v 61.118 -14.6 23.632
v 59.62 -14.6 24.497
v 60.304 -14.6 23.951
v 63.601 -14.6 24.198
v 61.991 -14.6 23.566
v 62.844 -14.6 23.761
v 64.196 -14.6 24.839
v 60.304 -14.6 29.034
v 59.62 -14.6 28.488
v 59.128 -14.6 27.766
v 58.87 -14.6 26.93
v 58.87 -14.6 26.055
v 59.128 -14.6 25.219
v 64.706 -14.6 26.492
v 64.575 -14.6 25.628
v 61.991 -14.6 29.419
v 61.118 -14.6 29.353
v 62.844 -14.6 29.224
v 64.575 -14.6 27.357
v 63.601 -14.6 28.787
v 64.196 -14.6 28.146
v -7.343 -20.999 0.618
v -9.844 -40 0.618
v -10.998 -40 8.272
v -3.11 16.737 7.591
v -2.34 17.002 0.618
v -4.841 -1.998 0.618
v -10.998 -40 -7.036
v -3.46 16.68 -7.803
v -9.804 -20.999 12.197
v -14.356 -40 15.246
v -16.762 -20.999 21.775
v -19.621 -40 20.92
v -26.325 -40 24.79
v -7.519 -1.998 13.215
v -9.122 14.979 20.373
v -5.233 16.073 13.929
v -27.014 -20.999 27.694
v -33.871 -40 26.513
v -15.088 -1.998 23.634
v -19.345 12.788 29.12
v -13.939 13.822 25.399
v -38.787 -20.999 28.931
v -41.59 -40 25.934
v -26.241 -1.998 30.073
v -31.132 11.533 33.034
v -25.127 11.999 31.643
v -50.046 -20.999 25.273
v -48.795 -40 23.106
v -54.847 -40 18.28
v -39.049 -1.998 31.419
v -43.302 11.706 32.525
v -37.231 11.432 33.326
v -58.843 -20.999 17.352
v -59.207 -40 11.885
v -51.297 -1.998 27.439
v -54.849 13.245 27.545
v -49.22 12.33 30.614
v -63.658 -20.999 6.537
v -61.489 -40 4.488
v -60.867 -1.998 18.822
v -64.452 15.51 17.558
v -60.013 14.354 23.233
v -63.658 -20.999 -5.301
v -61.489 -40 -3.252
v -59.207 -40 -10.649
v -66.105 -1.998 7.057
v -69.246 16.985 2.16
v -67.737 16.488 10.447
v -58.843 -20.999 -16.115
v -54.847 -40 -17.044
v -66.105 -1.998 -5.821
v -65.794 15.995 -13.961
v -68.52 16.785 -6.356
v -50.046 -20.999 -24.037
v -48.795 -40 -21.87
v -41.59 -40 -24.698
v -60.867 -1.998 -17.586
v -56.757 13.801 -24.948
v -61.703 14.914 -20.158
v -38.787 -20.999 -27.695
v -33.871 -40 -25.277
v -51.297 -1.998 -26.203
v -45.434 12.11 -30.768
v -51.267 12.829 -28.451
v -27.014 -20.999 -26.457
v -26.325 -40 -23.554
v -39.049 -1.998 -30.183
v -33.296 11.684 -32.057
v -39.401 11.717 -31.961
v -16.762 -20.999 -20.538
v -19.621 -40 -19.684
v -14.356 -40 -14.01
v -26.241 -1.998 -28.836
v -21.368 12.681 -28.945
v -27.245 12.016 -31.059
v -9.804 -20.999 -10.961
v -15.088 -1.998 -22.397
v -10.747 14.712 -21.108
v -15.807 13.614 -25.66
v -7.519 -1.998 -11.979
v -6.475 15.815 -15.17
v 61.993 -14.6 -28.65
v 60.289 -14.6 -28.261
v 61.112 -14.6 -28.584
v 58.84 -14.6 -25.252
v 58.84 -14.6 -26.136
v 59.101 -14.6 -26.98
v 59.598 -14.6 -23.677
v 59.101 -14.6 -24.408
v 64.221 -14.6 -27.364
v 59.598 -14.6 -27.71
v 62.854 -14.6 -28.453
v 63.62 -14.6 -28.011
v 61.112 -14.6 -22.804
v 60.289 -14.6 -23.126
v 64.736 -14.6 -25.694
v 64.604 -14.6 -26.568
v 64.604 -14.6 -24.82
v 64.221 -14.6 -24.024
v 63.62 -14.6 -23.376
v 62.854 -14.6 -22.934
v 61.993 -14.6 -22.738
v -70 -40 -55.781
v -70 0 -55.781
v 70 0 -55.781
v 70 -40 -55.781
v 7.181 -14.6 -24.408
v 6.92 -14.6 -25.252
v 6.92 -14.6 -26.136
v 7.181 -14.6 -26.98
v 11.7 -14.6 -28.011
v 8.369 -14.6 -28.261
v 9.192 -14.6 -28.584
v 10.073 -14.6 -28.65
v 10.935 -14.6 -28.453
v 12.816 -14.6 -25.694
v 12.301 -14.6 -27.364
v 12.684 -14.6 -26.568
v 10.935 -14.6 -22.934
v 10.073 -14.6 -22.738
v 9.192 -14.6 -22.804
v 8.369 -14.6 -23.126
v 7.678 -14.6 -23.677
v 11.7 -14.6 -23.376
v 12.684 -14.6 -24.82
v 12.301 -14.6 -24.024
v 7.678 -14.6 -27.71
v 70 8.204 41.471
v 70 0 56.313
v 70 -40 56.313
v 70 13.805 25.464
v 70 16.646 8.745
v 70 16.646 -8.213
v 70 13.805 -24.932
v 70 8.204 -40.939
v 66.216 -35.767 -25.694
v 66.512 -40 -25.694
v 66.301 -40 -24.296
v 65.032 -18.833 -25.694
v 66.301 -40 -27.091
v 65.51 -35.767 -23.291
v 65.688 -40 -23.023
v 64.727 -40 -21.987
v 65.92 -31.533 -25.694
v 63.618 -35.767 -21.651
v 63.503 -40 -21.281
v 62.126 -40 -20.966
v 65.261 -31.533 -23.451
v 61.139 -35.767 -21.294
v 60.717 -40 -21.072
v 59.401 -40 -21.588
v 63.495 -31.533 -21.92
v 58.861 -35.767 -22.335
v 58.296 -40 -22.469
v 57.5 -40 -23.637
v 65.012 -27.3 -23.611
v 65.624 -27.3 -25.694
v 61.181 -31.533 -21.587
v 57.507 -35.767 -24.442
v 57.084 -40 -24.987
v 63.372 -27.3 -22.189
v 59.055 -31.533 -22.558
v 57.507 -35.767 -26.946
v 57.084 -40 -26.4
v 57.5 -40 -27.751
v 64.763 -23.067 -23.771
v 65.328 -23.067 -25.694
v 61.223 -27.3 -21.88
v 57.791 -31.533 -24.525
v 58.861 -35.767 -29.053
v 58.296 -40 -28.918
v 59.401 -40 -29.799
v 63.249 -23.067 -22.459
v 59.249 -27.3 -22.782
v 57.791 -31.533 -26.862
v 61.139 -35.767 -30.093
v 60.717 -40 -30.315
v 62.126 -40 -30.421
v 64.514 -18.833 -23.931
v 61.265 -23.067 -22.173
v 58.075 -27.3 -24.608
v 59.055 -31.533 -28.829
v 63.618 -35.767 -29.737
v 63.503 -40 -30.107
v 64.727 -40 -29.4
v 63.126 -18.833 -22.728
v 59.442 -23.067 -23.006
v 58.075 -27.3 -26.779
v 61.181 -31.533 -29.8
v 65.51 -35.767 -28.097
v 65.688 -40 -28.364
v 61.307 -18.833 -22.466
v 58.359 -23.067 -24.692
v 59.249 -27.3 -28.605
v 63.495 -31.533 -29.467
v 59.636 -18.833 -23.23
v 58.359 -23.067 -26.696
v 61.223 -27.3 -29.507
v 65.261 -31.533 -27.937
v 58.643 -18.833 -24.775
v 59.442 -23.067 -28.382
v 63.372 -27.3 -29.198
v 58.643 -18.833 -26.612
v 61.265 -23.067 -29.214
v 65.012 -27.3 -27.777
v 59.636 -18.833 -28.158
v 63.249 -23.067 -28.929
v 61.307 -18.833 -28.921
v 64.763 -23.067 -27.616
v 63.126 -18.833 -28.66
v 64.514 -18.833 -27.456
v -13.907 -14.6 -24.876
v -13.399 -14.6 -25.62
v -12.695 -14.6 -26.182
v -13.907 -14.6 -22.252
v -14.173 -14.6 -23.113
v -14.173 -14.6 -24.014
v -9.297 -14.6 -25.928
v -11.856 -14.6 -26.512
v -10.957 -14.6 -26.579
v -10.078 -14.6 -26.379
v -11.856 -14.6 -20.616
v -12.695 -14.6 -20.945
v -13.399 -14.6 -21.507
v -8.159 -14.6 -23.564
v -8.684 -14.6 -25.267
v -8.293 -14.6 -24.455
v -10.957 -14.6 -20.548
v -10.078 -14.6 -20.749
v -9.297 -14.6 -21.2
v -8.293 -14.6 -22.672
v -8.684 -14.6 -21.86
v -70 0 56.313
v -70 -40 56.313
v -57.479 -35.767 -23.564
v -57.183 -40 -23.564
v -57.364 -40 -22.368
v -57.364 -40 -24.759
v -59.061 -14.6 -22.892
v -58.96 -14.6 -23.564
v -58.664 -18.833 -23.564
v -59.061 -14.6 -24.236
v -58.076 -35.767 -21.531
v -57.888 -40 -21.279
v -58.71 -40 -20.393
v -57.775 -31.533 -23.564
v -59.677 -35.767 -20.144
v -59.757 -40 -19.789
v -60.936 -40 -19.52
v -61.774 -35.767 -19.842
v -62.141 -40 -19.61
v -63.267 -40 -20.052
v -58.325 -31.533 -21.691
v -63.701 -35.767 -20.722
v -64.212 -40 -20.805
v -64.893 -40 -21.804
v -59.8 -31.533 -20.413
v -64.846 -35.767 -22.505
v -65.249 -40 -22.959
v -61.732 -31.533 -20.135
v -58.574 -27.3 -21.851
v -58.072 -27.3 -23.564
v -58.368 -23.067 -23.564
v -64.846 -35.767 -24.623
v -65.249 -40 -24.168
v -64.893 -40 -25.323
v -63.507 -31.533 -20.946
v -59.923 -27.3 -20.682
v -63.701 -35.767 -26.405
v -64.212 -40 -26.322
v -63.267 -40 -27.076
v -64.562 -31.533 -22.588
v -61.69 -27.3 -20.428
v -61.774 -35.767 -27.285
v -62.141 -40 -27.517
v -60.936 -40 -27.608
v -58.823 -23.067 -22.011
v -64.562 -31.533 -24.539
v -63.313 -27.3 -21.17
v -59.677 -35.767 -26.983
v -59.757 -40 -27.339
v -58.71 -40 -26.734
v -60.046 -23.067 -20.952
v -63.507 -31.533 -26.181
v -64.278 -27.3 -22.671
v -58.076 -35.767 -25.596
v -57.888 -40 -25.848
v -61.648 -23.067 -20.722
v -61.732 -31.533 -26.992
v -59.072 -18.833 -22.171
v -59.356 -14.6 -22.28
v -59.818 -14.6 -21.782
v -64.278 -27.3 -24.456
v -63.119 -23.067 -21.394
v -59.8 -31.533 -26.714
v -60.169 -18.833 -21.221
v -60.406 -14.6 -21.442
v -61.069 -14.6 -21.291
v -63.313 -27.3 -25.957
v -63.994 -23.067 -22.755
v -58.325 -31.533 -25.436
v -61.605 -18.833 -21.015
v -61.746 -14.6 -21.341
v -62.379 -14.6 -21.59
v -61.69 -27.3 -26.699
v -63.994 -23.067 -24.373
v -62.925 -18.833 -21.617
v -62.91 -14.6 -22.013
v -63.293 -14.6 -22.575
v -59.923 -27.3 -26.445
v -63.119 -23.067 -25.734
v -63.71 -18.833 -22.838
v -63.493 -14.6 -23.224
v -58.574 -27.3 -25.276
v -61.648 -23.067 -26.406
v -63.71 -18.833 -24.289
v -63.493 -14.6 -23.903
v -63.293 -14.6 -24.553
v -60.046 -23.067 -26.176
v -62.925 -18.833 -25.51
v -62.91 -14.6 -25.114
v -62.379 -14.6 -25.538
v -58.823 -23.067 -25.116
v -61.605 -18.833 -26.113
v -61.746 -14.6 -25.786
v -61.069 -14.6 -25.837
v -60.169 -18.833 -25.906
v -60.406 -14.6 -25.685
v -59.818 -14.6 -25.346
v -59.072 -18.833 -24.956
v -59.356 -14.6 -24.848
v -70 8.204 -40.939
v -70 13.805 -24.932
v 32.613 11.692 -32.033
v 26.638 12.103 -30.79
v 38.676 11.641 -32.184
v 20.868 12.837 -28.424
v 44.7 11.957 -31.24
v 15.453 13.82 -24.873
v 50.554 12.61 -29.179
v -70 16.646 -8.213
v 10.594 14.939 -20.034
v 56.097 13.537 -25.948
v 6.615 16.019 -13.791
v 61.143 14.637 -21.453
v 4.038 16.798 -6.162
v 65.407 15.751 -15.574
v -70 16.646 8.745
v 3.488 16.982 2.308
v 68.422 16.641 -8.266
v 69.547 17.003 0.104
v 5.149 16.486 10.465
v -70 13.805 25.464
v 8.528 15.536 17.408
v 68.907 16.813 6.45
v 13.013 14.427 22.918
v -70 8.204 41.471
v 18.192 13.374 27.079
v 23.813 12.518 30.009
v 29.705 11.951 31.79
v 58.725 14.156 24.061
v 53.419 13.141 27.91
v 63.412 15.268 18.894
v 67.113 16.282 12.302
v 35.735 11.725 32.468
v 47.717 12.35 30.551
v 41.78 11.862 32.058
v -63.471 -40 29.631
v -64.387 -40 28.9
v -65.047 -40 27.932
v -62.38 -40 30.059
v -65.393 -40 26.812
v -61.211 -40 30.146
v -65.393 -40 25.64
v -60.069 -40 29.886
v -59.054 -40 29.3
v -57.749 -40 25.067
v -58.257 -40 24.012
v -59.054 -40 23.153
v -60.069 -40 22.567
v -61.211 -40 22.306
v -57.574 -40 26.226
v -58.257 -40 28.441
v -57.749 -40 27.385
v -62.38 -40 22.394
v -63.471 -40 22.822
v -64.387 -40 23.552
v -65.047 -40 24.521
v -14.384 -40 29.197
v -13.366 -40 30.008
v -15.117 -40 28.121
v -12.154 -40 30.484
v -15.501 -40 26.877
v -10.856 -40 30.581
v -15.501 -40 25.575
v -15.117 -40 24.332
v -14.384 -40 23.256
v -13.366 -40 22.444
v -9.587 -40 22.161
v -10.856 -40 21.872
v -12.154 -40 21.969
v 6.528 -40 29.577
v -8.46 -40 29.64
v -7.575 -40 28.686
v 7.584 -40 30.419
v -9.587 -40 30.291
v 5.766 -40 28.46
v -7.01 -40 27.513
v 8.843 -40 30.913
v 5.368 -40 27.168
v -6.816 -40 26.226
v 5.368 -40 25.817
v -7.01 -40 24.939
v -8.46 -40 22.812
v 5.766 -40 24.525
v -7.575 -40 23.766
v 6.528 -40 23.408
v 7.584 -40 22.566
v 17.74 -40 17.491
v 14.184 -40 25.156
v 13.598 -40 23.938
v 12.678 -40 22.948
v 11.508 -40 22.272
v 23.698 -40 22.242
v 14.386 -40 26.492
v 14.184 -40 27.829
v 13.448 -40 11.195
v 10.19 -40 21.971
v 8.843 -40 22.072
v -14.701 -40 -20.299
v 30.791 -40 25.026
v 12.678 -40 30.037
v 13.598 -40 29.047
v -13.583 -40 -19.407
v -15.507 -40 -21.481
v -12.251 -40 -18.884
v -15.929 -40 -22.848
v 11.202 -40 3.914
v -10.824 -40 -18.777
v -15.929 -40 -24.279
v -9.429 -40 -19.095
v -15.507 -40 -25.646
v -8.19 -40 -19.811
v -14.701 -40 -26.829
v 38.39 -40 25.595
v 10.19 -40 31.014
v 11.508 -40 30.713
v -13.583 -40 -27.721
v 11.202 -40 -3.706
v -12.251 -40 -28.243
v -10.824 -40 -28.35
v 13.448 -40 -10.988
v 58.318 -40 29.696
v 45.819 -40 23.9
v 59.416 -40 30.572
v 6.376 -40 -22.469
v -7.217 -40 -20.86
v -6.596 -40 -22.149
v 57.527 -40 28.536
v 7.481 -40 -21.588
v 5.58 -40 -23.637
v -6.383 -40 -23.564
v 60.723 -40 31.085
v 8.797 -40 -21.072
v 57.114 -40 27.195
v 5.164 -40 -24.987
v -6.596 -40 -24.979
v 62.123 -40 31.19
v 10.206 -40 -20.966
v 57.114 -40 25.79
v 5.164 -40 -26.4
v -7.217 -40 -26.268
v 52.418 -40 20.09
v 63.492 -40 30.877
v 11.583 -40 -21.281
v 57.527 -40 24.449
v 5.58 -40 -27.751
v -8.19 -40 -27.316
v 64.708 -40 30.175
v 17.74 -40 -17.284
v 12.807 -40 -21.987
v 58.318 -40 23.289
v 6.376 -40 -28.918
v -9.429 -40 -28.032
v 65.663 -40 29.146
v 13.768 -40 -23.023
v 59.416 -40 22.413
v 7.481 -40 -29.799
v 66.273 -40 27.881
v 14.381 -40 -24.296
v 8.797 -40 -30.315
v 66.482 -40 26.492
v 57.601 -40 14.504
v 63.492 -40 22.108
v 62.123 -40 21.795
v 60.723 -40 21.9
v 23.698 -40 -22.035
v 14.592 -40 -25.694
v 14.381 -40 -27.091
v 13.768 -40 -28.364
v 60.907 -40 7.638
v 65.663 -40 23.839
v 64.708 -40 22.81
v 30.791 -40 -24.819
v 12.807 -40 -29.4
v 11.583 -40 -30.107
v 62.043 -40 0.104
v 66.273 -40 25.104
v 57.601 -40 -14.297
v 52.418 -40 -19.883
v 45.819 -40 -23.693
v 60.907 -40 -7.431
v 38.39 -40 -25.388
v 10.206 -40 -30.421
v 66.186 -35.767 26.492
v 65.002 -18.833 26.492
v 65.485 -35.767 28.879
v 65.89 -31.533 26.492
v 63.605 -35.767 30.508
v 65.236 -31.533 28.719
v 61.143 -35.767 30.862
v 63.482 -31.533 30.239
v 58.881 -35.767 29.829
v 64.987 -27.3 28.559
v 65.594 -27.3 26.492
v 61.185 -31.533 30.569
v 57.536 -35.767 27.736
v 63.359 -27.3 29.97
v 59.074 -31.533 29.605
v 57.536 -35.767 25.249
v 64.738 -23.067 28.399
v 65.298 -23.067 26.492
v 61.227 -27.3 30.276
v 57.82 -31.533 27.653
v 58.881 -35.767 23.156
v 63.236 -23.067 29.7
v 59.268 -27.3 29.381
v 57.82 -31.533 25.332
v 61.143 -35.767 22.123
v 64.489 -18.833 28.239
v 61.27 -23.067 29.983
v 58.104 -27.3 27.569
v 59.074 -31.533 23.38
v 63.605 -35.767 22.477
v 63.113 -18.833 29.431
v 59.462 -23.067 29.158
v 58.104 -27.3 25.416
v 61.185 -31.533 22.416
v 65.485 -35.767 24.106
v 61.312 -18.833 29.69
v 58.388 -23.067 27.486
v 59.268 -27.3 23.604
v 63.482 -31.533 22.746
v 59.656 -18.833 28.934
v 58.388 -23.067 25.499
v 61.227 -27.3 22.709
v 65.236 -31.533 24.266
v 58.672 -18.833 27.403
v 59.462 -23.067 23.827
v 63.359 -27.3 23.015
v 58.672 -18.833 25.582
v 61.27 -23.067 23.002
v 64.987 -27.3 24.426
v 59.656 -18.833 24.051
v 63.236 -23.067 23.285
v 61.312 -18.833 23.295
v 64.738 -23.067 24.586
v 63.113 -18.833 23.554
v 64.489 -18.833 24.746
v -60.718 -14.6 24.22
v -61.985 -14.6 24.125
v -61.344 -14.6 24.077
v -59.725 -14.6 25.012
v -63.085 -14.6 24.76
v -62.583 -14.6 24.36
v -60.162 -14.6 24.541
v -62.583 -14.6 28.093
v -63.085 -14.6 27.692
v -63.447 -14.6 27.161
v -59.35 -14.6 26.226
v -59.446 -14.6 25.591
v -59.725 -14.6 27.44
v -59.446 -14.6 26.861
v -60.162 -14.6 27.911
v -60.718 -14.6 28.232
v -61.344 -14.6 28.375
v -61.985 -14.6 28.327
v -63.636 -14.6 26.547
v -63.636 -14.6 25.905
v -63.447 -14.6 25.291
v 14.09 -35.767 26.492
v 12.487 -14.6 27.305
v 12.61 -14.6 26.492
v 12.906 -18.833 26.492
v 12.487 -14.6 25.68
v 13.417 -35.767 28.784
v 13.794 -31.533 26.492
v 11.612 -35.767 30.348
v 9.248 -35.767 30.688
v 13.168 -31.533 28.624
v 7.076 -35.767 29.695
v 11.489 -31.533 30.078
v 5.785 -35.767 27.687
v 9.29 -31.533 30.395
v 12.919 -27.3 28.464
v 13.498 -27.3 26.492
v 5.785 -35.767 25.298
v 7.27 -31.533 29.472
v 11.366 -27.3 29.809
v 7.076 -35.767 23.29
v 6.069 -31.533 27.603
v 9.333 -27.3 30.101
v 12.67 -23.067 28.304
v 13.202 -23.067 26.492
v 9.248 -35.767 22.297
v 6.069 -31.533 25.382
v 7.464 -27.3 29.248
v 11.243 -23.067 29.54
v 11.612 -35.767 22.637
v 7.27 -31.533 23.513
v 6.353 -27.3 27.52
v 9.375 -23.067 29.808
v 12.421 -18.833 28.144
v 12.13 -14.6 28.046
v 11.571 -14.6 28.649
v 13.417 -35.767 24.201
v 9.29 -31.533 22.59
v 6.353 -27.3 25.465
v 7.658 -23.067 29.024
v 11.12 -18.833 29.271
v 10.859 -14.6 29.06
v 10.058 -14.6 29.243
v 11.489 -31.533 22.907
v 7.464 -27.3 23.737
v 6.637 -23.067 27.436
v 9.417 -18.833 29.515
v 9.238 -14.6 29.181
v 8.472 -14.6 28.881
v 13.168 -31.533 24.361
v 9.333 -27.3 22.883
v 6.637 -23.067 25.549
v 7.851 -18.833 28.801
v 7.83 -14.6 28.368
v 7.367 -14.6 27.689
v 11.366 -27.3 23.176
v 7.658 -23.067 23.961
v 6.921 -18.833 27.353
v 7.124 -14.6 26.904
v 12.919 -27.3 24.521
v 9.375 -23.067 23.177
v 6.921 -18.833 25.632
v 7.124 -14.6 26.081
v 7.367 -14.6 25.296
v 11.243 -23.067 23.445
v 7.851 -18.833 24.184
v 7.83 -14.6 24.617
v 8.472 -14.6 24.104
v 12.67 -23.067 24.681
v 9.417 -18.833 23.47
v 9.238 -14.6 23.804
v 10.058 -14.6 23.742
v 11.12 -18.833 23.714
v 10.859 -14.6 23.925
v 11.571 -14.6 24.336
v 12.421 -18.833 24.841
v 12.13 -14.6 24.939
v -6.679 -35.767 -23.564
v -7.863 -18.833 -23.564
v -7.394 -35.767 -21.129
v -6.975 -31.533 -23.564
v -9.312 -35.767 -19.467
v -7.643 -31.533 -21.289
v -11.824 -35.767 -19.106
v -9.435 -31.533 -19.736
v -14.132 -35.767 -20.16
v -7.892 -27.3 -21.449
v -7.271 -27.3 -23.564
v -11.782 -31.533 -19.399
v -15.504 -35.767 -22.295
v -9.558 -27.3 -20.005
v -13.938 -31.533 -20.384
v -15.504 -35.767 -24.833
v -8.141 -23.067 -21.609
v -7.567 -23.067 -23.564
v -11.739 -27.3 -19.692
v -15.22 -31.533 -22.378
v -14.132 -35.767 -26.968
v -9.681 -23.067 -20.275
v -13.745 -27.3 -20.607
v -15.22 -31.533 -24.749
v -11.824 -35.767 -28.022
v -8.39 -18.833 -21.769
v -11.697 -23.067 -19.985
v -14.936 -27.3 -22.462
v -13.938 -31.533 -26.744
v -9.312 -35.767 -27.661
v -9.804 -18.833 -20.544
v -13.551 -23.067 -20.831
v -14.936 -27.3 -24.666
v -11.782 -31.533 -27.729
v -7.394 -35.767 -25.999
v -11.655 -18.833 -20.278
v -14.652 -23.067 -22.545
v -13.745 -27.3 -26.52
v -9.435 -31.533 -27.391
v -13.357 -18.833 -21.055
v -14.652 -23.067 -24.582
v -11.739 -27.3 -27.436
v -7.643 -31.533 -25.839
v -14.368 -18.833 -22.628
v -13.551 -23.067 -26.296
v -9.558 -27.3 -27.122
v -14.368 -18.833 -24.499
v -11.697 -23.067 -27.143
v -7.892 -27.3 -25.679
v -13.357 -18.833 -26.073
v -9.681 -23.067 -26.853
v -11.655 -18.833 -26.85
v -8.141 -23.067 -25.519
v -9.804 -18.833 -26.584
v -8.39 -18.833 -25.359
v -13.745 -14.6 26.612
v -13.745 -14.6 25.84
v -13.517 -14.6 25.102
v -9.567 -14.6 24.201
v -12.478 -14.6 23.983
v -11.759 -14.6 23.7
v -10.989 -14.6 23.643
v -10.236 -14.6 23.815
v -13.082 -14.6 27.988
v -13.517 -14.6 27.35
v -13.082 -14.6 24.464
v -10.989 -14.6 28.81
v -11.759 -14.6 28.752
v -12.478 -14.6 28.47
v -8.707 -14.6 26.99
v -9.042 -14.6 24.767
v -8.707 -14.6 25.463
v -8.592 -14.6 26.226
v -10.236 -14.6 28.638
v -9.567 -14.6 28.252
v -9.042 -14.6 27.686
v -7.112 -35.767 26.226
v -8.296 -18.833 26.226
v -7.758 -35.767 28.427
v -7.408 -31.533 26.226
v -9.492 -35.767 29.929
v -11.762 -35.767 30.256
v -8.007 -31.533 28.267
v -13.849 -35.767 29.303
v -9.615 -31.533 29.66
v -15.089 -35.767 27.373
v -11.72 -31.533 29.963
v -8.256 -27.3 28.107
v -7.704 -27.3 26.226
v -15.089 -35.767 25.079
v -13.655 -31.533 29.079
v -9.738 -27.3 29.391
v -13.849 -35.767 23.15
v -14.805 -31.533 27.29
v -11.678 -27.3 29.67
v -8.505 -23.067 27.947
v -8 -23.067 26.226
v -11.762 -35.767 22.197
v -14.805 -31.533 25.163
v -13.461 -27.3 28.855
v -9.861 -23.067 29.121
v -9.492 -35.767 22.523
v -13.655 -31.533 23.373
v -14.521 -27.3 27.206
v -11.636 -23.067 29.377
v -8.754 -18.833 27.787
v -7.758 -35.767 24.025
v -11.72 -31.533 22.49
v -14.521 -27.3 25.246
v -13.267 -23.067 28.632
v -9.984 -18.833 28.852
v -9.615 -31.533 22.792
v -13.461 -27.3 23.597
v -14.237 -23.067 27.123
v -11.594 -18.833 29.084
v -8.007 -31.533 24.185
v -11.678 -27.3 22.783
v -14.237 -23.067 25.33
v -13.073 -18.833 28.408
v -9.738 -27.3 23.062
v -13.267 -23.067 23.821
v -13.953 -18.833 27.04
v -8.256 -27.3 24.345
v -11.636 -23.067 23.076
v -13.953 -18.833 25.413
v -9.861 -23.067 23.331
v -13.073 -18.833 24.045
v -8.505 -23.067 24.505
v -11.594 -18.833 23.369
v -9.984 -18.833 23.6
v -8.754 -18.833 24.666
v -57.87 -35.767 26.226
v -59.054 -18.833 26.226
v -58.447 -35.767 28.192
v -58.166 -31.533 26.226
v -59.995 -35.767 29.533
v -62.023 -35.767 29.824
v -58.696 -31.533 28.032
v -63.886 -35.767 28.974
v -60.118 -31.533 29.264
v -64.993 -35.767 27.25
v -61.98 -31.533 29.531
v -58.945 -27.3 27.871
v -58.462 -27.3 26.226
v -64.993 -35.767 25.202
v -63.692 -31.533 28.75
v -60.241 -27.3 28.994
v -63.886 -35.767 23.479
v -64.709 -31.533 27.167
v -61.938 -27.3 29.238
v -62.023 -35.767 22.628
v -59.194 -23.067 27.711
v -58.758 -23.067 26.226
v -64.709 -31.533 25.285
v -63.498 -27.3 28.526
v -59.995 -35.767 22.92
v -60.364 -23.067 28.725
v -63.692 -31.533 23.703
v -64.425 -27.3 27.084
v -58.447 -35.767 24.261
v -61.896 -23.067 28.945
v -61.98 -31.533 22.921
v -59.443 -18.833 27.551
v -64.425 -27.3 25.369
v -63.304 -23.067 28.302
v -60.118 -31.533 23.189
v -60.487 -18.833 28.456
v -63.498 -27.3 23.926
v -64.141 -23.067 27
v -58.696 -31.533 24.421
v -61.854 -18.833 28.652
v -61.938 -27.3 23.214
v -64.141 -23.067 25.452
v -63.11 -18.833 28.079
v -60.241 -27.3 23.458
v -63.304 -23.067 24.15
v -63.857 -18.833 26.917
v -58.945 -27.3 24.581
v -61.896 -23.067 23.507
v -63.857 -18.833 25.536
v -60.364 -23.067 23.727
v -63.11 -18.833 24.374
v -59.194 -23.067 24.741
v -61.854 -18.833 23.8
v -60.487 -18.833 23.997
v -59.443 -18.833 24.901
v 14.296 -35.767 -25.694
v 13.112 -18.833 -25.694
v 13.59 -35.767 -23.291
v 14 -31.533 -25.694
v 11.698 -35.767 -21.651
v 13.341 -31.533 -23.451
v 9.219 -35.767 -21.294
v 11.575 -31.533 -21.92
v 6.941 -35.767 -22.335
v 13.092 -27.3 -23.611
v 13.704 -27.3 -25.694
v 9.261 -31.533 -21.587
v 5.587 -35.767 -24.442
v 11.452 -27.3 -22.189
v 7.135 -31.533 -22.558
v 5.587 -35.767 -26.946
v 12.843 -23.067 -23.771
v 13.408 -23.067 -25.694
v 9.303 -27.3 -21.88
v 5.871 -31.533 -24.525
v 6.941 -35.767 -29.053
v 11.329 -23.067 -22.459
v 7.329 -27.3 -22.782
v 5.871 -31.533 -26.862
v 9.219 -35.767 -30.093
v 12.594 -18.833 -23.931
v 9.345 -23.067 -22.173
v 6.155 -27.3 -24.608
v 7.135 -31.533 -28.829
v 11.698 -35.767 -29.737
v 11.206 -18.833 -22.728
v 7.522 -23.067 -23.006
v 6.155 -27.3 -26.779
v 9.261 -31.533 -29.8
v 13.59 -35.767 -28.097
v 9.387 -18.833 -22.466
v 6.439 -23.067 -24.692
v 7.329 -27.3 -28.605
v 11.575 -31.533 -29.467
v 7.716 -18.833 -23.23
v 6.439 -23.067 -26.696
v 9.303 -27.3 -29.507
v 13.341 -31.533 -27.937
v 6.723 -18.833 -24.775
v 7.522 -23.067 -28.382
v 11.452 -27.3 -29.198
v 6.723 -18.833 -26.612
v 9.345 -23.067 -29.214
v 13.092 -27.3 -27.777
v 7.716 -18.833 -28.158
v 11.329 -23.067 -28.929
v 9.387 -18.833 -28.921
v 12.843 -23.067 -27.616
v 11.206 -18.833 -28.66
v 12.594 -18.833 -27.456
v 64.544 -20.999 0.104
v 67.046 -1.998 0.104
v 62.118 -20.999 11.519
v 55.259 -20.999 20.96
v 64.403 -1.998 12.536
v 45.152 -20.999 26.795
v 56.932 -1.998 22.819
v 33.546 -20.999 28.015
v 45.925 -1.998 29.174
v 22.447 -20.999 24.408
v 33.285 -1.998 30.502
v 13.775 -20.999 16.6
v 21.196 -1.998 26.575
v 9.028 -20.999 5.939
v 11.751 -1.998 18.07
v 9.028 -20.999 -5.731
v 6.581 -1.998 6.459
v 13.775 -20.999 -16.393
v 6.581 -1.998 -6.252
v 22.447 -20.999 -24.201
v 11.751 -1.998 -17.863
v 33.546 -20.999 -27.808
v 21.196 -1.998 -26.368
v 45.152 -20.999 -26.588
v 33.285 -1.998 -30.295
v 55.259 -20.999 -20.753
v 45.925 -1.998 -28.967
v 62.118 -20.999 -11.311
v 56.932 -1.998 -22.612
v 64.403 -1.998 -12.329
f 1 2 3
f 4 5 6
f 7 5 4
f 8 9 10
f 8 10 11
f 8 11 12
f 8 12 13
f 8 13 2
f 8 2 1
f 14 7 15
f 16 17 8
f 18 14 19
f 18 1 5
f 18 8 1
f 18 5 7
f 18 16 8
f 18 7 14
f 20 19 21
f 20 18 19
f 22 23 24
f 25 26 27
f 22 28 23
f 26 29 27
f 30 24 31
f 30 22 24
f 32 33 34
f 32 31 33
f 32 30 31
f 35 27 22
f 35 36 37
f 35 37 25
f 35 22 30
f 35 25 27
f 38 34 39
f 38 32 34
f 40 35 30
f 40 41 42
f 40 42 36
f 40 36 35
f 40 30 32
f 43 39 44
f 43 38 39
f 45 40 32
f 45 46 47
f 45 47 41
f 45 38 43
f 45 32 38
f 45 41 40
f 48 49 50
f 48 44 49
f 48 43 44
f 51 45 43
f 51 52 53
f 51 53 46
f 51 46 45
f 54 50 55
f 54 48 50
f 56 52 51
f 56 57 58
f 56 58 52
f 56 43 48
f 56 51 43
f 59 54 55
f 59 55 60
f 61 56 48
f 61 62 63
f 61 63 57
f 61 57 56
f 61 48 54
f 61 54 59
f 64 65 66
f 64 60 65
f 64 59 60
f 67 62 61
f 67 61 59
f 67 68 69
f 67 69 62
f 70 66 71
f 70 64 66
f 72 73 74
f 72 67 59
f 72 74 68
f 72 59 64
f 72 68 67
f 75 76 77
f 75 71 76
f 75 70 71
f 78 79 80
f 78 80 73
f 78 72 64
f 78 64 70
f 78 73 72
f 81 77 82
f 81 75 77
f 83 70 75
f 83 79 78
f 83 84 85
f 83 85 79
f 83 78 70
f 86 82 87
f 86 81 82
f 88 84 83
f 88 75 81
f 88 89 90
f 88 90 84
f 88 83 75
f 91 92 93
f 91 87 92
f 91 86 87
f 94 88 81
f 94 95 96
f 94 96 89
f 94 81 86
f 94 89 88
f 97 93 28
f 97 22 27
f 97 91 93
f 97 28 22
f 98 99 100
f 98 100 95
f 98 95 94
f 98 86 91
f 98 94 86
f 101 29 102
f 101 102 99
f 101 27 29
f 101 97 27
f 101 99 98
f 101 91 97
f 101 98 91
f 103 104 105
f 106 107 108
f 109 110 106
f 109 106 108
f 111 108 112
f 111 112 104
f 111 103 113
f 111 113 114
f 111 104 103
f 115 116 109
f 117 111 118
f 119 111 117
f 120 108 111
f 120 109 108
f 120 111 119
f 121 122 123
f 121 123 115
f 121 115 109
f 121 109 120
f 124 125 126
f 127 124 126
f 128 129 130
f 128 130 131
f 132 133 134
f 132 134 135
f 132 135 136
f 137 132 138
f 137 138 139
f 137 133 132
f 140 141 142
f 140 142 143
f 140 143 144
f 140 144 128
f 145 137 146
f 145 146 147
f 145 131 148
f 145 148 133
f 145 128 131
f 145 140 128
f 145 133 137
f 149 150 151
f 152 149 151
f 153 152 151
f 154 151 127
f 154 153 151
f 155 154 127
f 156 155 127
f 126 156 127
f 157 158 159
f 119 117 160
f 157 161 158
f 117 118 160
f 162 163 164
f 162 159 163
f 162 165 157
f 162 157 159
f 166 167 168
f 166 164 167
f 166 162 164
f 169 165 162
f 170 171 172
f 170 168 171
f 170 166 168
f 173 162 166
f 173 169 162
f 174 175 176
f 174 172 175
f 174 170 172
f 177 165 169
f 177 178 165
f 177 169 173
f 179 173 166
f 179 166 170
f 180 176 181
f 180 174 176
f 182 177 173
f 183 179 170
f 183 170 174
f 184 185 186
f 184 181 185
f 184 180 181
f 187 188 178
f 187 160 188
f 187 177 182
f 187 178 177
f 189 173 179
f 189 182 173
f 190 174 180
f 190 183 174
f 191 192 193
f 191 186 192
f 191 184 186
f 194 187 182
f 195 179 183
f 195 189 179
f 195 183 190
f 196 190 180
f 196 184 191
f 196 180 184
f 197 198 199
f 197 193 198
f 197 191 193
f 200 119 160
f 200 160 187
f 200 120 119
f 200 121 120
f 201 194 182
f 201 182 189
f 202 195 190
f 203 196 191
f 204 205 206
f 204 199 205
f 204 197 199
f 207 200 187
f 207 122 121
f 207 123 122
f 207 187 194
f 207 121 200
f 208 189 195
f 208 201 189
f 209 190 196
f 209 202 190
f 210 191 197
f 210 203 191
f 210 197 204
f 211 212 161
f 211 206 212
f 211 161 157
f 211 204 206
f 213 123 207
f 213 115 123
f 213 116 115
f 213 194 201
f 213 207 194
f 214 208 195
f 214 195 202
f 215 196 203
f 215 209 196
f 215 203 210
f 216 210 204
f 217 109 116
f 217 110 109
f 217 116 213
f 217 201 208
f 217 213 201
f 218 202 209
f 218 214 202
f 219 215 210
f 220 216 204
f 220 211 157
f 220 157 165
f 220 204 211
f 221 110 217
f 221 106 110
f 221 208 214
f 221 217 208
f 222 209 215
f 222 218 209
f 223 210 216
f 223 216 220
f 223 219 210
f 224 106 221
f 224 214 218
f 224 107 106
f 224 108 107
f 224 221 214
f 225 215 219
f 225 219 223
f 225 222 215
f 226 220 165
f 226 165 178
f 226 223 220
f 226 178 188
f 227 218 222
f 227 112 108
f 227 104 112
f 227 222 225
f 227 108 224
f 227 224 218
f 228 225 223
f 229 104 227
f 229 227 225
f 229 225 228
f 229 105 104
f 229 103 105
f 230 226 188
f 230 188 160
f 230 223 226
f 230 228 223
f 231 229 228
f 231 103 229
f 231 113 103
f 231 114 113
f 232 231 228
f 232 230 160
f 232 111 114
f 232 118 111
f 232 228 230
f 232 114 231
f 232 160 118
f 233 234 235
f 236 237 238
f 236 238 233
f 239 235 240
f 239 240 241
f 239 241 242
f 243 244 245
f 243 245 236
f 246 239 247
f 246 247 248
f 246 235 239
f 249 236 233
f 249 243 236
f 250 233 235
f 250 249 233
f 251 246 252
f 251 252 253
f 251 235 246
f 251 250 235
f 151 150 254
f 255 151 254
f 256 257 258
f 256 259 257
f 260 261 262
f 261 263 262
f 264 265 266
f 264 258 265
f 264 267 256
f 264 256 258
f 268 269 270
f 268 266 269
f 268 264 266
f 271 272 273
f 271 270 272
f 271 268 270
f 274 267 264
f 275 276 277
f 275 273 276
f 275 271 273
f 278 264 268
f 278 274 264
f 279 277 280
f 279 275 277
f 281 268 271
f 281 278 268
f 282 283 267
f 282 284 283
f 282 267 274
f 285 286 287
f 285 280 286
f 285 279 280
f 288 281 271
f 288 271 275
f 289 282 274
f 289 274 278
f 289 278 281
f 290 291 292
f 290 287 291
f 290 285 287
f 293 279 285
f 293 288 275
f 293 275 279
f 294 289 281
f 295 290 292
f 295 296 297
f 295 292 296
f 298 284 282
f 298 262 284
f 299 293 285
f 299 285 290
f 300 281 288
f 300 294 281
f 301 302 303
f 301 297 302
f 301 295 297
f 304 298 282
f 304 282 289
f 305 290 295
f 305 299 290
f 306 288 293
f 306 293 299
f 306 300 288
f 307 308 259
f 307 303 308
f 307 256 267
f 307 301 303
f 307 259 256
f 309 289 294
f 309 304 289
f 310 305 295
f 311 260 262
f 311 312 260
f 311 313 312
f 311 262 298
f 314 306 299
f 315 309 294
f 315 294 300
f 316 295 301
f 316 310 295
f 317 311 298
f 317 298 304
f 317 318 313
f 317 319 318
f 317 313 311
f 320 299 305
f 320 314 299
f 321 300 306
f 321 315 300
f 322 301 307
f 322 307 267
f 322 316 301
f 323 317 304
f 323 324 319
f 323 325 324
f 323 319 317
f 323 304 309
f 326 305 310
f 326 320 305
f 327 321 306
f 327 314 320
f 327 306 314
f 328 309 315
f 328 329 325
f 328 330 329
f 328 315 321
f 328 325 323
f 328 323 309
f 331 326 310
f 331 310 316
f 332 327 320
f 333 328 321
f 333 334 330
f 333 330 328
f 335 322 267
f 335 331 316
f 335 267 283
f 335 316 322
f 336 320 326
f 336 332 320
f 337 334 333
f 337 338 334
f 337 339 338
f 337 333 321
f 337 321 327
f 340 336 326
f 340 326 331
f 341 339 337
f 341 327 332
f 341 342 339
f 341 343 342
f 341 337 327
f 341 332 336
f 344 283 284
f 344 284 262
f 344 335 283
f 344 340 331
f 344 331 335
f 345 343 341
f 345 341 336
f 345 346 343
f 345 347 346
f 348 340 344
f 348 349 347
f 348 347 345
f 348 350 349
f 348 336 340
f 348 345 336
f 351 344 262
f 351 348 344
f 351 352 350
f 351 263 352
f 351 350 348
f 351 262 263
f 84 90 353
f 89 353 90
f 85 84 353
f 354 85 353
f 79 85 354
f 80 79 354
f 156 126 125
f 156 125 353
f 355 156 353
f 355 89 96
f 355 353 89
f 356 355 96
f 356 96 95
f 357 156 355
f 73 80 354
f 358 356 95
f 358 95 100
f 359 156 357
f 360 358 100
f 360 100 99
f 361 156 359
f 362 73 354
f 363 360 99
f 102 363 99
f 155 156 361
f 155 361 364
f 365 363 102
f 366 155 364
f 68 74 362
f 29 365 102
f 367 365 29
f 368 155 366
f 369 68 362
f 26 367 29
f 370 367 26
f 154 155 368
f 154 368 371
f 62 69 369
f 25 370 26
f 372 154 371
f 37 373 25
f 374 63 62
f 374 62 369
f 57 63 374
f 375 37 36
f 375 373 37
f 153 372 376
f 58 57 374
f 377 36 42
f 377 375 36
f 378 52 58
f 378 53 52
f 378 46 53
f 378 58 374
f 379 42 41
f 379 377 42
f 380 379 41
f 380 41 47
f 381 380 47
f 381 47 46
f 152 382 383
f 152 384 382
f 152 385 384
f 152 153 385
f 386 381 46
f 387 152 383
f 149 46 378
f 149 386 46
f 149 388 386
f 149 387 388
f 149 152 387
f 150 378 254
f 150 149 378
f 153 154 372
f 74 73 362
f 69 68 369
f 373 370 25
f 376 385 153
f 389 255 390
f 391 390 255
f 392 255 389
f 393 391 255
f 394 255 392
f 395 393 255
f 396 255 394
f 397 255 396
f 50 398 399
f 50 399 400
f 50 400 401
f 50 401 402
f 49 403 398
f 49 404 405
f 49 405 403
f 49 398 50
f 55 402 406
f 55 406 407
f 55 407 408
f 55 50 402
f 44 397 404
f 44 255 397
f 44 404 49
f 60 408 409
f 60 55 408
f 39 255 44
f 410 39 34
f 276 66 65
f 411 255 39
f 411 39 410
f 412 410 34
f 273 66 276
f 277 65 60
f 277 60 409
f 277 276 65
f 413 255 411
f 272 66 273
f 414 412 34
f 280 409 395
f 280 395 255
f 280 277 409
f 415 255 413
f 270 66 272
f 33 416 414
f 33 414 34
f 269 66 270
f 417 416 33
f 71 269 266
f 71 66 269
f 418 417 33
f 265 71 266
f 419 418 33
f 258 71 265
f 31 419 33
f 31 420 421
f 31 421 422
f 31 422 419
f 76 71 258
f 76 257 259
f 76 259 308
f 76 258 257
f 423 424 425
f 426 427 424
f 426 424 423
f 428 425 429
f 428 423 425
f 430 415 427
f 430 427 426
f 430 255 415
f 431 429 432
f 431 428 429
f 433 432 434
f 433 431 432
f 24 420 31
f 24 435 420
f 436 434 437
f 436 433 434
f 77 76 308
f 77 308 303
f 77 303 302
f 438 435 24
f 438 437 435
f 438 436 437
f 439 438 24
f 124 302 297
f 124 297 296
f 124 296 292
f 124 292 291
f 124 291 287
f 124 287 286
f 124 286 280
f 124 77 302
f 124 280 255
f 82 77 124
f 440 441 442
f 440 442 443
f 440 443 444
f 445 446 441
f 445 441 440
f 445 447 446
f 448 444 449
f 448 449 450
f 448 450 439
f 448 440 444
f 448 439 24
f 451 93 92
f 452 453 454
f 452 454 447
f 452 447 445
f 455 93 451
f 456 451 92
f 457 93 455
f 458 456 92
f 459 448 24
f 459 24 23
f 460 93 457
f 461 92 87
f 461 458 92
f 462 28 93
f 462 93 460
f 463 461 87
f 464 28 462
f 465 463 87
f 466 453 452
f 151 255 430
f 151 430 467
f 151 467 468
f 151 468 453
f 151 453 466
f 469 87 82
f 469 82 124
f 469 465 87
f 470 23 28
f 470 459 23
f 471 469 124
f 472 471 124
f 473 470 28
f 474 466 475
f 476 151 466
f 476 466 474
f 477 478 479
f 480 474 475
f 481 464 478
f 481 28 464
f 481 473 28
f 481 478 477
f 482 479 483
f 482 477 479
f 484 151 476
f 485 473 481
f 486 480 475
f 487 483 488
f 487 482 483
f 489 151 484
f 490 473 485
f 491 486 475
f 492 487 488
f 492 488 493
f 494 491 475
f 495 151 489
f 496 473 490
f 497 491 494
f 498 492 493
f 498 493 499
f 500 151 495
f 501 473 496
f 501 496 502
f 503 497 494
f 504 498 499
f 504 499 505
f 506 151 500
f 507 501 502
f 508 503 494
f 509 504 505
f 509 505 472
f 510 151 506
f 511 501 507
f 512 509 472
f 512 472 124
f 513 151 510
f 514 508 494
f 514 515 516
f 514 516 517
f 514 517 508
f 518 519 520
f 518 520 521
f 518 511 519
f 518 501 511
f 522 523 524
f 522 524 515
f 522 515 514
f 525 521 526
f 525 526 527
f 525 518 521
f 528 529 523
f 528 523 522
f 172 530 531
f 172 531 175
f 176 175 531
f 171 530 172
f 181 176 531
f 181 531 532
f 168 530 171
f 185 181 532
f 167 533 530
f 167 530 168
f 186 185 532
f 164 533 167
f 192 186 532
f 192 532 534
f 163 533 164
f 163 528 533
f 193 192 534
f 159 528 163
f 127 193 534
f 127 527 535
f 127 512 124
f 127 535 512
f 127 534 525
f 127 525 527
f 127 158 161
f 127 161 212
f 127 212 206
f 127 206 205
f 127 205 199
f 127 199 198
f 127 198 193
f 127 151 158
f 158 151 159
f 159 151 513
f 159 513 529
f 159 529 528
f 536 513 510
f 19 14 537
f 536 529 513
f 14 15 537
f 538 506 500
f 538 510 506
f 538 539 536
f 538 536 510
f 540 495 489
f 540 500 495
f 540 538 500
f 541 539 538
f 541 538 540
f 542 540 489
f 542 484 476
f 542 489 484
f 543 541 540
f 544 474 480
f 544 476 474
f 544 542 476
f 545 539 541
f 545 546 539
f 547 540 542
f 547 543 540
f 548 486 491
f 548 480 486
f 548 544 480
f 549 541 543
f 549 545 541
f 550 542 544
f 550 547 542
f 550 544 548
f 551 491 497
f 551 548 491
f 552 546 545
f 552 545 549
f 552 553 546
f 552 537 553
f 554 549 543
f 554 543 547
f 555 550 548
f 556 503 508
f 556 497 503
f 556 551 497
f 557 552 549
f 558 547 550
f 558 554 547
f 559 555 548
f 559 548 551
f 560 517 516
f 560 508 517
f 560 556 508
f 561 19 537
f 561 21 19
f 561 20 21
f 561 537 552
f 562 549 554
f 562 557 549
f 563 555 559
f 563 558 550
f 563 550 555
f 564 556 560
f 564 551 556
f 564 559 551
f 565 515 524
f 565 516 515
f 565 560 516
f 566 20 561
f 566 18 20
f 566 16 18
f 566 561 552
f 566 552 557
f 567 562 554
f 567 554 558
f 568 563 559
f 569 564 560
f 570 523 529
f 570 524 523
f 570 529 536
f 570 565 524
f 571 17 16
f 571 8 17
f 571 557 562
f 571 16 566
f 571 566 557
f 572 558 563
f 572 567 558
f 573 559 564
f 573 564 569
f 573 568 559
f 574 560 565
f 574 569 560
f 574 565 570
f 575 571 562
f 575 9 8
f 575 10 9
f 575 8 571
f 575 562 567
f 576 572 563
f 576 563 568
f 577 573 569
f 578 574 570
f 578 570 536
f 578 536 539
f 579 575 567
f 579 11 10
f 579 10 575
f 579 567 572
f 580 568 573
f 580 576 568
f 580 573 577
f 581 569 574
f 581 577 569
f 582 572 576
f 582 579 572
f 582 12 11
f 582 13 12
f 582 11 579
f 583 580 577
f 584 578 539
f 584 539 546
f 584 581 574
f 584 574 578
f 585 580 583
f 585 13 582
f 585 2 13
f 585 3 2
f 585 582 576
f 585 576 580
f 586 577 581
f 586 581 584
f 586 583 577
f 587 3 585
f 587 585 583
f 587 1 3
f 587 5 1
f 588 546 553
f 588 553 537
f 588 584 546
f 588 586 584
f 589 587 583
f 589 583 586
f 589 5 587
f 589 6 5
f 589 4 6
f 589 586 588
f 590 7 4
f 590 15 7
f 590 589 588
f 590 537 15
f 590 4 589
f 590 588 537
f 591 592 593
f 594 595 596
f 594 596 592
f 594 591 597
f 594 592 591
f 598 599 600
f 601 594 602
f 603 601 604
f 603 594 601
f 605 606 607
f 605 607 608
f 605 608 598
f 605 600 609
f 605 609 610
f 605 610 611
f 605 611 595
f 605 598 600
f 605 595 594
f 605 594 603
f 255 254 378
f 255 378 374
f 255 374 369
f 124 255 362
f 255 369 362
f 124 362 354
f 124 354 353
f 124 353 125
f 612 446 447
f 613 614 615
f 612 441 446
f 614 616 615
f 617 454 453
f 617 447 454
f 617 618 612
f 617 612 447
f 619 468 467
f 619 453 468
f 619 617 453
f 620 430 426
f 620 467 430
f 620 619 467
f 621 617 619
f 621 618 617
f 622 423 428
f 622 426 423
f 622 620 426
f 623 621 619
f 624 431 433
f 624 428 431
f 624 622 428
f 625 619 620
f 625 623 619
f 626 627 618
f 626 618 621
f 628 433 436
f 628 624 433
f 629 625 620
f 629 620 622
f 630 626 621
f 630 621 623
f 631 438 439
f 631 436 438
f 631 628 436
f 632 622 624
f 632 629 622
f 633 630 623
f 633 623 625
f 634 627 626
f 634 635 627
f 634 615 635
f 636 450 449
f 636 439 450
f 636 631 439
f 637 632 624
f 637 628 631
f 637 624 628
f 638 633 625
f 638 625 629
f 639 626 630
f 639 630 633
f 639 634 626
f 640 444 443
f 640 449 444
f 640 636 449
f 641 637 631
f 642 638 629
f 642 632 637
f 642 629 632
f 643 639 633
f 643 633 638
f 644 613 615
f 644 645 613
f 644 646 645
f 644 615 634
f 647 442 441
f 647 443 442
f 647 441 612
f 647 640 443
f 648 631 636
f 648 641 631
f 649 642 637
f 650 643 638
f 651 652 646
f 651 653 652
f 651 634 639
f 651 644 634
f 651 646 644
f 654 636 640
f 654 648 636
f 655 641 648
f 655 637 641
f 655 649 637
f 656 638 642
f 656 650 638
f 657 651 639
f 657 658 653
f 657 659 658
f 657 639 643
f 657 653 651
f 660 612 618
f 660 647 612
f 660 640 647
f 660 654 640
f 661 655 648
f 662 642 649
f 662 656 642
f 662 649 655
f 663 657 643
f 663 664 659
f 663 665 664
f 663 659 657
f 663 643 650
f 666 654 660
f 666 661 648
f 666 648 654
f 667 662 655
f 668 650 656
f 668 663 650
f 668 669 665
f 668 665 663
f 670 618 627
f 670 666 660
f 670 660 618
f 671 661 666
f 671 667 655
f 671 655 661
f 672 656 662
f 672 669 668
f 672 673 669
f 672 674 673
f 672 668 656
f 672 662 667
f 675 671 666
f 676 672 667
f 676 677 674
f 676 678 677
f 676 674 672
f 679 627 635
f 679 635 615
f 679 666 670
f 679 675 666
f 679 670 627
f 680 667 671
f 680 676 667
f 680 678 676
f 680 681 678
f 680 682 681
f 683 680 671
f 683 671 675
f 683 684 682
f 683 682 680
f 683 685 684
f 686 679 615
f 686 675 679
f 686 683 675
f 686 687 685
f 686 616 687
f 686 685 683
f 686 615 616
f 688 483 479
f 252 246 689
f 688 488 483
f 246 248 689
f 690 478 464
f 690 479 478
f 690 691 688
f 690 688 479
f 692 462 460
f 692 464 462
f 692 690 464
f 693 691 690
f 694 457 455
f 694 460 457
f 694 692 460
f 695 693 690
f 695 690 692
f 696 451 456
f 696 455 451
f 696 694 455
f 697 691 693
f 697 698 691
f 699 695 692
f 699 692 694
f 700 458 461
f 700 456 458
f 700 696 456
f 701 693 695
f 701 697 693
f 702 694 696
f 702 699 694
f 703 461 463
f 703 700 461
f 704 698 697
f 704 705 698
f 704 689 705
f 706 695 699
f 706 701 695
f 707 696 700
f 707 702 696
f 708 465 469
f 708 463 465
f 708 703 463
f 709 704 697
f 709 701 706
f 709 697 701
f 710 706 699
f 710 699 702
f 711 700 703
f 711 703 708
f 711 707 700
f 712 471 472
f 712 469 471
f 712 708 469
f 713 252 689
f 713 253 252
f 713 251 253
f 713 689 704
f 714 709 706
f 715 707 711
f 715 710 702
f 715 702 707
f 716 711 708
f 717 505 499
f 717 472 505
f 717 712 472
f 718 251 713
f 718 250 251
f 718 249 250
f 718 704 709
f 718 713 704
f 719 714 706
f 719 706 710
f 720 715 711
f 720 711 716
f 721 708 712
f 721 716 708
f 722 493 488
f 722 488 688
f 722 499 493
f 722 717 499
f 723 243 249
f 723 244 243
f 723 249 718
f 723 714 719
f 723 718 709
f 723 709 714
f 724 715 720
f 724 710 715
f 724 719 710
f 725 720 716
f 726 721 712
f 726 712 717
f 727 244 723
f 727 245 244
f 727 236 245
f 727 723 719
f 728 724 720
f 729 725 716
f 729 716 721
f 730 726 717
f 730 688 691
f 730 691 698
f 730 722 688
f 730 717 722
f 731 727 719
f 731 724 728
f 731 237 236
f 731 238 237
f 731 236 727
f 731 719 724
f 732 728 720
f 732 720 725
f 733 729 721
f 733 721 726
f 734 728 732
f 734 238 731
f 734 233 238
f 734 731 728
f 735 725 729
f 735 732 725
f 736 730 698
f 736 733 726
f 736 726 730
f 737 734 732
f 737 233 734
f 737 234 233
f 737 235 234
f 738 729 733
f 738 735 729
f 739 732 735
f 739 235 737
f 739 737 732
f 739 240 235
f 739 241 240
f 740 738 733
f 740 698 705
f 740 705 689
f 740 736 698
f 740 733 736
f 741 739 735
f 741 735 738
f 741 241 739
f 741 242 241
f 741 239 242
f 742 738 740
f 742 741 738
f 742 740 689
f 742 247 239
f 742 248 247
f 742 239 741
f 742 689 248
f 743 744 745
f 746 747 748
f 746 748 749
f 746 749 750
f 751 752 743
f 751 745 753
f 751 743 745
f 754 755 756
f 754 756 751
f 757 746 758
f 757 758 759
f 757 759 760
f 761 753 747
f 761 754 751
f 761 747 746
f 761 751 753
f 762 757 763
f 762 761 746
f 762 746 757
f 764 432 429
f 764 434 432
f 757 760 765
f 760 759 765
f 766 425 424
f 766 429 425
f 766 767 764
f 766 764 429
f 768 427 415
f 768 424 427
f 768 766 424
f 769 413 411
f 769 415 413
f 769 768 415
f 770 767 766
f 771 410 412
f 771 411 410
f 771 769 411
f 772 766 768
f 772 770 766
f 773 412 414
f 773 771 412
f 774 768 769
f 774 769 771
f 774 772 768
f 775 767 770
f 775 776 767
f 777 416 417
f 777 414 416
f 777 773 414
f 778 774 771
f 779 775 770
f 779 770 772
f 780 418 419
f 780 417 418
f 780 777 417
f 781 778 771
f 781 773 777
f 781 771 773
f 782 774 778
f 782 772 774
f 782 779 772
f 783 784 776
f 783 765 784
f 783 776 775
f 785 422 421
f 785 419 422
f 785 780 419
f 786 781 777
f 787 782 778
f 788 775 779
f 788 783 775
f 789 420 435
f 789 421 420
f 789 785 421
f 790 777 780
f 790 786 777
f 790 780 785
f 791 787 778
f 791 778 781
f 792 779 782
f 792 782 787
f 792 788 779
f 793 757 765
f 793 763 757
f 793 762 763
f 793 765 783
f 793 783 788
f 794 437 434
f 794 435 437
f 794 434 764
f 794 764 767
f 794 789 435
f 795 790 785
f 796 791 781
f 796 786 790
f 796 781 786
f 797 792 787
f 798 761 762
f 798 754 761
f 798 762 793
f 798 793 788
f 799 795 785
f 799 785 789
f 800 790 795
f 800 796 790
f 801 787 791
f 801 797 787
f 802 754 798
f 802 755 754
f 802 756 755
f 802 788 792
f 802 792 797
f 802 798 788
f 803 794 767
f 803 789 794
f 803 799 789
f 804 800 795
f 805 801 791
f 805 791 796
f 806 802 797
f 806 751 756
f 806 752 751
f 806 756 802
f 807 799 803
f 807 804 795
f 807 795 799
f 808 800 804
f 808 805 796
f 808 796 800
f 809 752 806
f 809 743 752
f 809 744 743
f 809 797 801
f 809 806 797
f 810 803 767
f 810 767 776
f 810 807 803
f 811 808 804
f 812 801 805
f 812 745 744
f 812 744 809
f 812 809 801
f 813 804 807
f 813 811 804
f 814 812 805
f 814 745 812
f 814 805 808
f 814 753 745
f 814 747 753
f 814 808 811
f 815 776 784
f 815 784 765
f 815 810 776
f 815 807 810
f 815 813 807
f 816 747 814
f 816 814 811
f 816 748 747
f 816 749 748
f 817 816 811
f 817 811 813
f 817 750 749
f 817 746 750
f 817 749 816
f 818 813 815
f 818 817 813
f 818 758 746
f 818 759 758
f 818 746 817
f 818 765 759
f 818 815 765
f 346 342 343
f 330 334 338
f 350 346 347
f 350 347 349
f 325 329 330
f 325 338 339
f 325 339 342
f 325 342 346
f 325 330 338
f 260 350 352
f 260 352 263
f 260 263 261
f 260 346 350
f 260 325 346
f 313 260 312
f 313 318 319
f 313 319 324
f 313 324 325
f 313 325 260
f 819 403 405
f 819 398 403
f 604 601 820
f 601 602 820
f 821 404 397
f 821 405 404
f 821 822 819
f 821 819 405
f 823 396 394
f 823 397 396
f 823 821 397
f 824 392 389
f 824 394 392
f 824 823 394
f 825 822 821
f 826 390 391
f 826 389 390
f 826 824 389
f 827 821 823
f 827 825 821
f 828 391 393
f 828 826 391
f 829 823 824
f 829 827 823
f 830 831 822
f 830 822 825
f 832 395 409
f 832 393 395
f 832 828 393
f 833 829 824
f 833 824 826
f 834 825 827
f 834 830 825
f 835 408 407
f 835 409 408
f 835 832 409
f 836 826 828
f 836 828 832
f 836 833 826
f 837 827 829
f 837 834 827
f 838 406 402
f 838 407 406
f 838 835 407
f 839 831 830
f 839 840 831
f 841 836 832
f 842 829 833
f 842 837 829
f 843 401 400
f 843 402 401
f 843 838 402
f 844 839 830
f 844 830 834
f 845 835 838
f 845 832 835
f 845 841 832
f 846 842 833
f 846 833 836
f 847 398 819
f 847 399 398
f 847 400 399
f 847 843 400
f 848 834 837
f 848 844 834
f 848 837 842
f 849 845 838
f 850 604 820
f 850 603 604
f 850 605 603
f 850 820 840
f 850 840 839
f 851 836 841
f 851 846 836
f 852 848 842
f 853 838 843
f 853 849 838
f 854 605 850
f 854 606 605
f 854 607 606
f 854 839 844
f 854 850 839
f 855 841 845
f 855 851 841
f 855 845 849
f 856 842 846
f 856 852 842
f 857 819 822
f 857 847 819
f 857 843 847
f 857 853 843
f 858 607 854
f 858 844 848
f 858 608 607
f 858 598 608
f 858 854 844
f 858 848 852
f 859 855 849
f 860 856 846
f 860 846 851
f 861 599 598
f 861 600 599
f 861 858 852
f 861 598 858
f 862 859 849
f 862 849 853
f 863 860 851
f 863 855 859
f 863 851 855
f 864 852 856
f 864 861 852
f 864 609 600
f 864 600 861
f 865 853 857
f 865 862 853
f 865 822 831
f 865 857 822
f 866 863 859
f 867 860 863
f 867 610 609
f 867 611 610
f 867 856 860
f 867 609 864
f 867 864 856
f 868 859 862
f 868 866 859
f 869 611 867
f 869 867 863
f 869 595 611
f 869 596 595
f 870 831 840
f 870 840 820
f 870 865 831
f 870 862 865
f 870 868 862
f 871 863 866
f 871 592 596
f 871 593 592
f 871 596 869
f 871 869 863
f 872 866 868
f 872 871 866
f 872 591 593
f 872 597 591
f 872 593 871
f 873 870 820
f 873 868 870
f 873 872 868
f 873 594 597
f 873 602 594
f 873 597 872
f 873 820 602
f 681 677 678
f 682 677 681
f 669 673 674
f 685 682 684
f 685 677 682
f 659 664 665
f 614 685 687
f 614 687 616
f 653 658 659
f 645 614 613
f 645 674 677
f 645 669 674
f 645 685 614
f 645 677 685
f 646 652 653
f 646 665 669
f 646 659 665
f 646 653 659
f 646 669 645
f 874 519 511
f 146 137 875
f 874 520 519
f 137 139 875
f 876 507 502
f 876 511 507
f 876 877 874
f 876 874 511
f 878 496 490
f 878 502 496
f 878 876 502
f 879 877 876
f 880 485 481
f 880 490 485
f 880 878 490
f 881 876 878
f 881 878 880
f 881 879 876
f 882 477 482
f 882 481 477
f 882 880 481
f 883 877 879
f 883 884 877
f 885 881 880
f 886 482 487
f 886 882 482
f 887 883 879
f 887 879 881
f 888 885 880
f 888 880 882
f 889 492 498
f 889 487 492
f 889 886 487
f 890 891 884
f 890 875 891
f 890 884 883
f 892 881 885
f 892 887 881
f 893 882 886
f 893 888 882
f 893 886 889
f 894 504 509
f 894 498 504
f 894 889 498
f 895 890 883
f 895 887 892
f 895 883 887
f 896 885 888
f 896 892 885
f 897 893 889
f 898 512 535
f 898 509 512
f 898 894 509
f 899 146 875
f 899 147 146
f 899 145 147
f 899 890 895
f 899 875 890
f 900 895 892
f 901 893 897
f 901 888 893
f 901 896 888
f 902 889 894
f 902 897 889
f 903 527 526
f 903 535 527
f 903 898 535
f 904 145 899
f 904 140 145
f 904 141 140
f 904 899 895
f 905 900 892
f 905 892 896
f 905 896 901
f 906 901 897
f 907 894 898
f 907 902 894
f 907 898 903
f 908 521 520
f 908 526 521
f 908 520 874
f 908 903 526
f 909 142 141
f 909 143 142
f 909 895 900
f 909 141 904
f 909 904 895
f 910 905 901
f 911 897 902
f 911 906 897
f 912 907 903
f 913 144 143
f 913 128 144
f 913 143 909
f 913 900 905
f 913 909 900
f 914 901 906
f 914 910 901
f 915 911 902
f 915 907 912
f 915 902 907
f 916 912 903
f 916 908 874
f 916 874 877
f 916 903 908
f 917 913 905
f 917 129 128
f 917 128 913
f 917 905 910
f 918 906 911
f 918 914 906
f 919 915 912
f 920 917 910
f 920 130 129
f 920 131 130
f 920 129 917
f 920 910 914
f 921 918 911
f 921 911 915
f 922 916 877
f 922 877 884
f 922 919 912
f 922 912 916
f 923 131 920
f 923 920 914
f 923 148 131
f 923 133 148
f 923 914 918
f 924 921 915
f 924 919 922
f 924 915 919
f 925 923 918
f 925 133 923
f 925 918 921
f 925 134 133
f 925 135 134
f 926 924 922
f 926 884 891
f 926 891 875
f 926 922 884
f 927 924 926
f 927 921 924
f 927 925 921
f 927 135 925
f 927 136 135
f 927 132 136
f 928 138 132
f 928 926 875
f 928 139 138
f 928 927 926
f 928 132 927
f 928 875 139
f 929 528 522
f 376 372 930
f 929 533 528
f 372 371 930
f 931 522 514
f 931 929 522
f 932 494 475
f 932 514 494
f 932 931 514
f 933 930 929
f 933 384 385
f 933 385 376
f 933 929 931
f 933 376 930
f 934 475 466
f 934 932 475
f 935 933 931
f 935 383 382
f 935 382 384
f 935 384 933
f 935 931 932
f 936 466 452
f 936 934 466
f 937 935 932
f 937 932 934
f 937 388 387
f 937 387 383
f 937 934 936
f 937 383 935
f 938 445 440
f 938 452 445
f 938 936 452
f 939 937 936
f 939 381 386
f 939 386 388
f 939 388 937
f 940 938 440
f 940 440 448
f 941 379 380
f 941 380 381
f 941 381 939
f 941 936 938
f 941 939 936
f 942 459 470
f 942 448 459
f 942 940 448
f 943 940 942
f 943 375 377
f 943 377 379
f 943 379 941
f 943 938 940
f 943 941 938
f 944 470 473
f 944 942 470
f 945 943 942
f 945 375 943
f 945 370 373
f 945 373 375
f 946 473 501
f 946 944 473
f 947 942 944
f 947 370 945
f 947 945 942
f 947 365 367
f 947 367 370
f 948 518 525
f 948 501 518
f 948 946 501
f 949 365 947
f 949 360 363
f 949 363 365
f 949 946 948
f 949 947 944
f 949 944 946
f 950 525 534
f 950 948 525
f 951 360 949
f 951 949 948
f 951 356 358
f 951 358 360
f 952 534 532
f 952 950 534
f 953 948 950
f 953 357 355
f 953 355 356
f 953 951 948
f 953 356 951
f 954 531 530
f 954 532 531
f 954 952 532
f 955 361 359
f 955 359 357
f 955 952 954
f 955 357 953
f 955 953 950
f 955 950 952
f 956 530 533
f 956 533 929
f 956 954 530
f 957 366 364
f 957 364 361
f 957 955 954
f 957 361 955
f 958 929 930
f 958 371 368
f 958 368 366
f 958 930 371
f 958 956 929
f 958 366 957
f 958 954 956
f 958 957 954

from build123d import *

# Parameters (mm, degrees)
F1_DEPTH  = 70
F2_DEPTH  = 70
F3_DEPTH  = 40
F4_R      = 25.9673411554
F4_R_2    = 25.5632964649
F5_DEPTH  = 101.6
F5_TAPER  = -7.5
F6_R      = 3.9312257392
F6_R_2    = 4.3669266887
F7_R      = 4.0554960028
F7_R_2    = 4.8000012206
F8_DEPTH  = 25.4
F8_TAPER  = 4
F9_R      = 4.5341790364
F9_R_2    = 4.7105540517
F9_R_3    = 4.7405563192
F9_R_4    = 4.7405580976
F10_DEPTH = 25.4
F10_TAPER = 4


with BuildPart() as f1:
    # F0 (on Right) → F1 (new body)
    with BuildSketch(Plane.YZ):
        with BuildLine():
            Line((0, 56.3131943345), (0, -55.7806827128))
            ThreePointArc((0, -55.7806827128), (17.0028912966, 0.2662558109), (0, 56.3131943345))
        make_face()
    extrude(amount=F1_DEPTH)

    # F2 (add): a face of the model
    f2_faces = [f1.faces().sort_by_distance(p)[0] for p in [
        (0, 6.8528110679, 0.2662558109),
    ]]
    extrude(f2_faces, amount=F2_DEPTH)

    # F3 (add): a face of the model
    f3_faces = [f1.faces().sort_by_distance(p)[0] for p in [
        (0, 0, 0.2662558109),
    ]]
    extrude(f3_faces, amount=F3_DEPTH)

    # F4 (on face) → F5 (cut)
    with BuildSketch(Plane.XZ.offset(40)):
        with Locations((-35.8114647679, 0.6180945247)):
            Circle(F4_R)
        with Locations((36.479592697, 0.1035452609)):
            Circle(F4_R_2)
    extrude(amount=-F5_DEPTH, taper=F5_TAPER, mode=Mode.SUBTRACT)

    # F6 (on face) + F7 (on face) → F8 (cut)
    with BuildSketch(Plane.XZ.offset(40)):
        with Locations((-61.5051910281, 26.2262392789)):
            Circle(F6_R)
        with Locations((-11.1827617511, 26.2262392789)):
            Circle(F6_R_2)
    with BuildSketch(Plane.XZ.offset(40)):
        with Locations((-61.2389370799, -23.5636774451)):
            Circle(F7_R)
        with Locations((-11.1827617511, -23.5636774451)):
            Circle(F7_R_2)
    extrude(amount=-F8_DEPTH, taper=F8_TAPER, mode=Mode.SUBTRACT)

    # F9 (on face) → F10 (cut)
    with BuildSketch(Plane.XZ.offset(40)):
        with Locations((9.8514817655, 26.4924950898)):
            Circle(F9_R)
        with Locations((61.7714524269, 26.4924950898)):
            Circle(F9_R_2)
        with Locations((61.7714524269, -25.6937257946)):
            Circle(F9_R_3)
        with Locations((9.8514817655, -25.6937257946)):
            Circle(F9_R_4)
    extrude(amount=-F10_DEPTH, taper=F10_TAPER, mode=Mode.SUBTRACT)


solid = f1.part
